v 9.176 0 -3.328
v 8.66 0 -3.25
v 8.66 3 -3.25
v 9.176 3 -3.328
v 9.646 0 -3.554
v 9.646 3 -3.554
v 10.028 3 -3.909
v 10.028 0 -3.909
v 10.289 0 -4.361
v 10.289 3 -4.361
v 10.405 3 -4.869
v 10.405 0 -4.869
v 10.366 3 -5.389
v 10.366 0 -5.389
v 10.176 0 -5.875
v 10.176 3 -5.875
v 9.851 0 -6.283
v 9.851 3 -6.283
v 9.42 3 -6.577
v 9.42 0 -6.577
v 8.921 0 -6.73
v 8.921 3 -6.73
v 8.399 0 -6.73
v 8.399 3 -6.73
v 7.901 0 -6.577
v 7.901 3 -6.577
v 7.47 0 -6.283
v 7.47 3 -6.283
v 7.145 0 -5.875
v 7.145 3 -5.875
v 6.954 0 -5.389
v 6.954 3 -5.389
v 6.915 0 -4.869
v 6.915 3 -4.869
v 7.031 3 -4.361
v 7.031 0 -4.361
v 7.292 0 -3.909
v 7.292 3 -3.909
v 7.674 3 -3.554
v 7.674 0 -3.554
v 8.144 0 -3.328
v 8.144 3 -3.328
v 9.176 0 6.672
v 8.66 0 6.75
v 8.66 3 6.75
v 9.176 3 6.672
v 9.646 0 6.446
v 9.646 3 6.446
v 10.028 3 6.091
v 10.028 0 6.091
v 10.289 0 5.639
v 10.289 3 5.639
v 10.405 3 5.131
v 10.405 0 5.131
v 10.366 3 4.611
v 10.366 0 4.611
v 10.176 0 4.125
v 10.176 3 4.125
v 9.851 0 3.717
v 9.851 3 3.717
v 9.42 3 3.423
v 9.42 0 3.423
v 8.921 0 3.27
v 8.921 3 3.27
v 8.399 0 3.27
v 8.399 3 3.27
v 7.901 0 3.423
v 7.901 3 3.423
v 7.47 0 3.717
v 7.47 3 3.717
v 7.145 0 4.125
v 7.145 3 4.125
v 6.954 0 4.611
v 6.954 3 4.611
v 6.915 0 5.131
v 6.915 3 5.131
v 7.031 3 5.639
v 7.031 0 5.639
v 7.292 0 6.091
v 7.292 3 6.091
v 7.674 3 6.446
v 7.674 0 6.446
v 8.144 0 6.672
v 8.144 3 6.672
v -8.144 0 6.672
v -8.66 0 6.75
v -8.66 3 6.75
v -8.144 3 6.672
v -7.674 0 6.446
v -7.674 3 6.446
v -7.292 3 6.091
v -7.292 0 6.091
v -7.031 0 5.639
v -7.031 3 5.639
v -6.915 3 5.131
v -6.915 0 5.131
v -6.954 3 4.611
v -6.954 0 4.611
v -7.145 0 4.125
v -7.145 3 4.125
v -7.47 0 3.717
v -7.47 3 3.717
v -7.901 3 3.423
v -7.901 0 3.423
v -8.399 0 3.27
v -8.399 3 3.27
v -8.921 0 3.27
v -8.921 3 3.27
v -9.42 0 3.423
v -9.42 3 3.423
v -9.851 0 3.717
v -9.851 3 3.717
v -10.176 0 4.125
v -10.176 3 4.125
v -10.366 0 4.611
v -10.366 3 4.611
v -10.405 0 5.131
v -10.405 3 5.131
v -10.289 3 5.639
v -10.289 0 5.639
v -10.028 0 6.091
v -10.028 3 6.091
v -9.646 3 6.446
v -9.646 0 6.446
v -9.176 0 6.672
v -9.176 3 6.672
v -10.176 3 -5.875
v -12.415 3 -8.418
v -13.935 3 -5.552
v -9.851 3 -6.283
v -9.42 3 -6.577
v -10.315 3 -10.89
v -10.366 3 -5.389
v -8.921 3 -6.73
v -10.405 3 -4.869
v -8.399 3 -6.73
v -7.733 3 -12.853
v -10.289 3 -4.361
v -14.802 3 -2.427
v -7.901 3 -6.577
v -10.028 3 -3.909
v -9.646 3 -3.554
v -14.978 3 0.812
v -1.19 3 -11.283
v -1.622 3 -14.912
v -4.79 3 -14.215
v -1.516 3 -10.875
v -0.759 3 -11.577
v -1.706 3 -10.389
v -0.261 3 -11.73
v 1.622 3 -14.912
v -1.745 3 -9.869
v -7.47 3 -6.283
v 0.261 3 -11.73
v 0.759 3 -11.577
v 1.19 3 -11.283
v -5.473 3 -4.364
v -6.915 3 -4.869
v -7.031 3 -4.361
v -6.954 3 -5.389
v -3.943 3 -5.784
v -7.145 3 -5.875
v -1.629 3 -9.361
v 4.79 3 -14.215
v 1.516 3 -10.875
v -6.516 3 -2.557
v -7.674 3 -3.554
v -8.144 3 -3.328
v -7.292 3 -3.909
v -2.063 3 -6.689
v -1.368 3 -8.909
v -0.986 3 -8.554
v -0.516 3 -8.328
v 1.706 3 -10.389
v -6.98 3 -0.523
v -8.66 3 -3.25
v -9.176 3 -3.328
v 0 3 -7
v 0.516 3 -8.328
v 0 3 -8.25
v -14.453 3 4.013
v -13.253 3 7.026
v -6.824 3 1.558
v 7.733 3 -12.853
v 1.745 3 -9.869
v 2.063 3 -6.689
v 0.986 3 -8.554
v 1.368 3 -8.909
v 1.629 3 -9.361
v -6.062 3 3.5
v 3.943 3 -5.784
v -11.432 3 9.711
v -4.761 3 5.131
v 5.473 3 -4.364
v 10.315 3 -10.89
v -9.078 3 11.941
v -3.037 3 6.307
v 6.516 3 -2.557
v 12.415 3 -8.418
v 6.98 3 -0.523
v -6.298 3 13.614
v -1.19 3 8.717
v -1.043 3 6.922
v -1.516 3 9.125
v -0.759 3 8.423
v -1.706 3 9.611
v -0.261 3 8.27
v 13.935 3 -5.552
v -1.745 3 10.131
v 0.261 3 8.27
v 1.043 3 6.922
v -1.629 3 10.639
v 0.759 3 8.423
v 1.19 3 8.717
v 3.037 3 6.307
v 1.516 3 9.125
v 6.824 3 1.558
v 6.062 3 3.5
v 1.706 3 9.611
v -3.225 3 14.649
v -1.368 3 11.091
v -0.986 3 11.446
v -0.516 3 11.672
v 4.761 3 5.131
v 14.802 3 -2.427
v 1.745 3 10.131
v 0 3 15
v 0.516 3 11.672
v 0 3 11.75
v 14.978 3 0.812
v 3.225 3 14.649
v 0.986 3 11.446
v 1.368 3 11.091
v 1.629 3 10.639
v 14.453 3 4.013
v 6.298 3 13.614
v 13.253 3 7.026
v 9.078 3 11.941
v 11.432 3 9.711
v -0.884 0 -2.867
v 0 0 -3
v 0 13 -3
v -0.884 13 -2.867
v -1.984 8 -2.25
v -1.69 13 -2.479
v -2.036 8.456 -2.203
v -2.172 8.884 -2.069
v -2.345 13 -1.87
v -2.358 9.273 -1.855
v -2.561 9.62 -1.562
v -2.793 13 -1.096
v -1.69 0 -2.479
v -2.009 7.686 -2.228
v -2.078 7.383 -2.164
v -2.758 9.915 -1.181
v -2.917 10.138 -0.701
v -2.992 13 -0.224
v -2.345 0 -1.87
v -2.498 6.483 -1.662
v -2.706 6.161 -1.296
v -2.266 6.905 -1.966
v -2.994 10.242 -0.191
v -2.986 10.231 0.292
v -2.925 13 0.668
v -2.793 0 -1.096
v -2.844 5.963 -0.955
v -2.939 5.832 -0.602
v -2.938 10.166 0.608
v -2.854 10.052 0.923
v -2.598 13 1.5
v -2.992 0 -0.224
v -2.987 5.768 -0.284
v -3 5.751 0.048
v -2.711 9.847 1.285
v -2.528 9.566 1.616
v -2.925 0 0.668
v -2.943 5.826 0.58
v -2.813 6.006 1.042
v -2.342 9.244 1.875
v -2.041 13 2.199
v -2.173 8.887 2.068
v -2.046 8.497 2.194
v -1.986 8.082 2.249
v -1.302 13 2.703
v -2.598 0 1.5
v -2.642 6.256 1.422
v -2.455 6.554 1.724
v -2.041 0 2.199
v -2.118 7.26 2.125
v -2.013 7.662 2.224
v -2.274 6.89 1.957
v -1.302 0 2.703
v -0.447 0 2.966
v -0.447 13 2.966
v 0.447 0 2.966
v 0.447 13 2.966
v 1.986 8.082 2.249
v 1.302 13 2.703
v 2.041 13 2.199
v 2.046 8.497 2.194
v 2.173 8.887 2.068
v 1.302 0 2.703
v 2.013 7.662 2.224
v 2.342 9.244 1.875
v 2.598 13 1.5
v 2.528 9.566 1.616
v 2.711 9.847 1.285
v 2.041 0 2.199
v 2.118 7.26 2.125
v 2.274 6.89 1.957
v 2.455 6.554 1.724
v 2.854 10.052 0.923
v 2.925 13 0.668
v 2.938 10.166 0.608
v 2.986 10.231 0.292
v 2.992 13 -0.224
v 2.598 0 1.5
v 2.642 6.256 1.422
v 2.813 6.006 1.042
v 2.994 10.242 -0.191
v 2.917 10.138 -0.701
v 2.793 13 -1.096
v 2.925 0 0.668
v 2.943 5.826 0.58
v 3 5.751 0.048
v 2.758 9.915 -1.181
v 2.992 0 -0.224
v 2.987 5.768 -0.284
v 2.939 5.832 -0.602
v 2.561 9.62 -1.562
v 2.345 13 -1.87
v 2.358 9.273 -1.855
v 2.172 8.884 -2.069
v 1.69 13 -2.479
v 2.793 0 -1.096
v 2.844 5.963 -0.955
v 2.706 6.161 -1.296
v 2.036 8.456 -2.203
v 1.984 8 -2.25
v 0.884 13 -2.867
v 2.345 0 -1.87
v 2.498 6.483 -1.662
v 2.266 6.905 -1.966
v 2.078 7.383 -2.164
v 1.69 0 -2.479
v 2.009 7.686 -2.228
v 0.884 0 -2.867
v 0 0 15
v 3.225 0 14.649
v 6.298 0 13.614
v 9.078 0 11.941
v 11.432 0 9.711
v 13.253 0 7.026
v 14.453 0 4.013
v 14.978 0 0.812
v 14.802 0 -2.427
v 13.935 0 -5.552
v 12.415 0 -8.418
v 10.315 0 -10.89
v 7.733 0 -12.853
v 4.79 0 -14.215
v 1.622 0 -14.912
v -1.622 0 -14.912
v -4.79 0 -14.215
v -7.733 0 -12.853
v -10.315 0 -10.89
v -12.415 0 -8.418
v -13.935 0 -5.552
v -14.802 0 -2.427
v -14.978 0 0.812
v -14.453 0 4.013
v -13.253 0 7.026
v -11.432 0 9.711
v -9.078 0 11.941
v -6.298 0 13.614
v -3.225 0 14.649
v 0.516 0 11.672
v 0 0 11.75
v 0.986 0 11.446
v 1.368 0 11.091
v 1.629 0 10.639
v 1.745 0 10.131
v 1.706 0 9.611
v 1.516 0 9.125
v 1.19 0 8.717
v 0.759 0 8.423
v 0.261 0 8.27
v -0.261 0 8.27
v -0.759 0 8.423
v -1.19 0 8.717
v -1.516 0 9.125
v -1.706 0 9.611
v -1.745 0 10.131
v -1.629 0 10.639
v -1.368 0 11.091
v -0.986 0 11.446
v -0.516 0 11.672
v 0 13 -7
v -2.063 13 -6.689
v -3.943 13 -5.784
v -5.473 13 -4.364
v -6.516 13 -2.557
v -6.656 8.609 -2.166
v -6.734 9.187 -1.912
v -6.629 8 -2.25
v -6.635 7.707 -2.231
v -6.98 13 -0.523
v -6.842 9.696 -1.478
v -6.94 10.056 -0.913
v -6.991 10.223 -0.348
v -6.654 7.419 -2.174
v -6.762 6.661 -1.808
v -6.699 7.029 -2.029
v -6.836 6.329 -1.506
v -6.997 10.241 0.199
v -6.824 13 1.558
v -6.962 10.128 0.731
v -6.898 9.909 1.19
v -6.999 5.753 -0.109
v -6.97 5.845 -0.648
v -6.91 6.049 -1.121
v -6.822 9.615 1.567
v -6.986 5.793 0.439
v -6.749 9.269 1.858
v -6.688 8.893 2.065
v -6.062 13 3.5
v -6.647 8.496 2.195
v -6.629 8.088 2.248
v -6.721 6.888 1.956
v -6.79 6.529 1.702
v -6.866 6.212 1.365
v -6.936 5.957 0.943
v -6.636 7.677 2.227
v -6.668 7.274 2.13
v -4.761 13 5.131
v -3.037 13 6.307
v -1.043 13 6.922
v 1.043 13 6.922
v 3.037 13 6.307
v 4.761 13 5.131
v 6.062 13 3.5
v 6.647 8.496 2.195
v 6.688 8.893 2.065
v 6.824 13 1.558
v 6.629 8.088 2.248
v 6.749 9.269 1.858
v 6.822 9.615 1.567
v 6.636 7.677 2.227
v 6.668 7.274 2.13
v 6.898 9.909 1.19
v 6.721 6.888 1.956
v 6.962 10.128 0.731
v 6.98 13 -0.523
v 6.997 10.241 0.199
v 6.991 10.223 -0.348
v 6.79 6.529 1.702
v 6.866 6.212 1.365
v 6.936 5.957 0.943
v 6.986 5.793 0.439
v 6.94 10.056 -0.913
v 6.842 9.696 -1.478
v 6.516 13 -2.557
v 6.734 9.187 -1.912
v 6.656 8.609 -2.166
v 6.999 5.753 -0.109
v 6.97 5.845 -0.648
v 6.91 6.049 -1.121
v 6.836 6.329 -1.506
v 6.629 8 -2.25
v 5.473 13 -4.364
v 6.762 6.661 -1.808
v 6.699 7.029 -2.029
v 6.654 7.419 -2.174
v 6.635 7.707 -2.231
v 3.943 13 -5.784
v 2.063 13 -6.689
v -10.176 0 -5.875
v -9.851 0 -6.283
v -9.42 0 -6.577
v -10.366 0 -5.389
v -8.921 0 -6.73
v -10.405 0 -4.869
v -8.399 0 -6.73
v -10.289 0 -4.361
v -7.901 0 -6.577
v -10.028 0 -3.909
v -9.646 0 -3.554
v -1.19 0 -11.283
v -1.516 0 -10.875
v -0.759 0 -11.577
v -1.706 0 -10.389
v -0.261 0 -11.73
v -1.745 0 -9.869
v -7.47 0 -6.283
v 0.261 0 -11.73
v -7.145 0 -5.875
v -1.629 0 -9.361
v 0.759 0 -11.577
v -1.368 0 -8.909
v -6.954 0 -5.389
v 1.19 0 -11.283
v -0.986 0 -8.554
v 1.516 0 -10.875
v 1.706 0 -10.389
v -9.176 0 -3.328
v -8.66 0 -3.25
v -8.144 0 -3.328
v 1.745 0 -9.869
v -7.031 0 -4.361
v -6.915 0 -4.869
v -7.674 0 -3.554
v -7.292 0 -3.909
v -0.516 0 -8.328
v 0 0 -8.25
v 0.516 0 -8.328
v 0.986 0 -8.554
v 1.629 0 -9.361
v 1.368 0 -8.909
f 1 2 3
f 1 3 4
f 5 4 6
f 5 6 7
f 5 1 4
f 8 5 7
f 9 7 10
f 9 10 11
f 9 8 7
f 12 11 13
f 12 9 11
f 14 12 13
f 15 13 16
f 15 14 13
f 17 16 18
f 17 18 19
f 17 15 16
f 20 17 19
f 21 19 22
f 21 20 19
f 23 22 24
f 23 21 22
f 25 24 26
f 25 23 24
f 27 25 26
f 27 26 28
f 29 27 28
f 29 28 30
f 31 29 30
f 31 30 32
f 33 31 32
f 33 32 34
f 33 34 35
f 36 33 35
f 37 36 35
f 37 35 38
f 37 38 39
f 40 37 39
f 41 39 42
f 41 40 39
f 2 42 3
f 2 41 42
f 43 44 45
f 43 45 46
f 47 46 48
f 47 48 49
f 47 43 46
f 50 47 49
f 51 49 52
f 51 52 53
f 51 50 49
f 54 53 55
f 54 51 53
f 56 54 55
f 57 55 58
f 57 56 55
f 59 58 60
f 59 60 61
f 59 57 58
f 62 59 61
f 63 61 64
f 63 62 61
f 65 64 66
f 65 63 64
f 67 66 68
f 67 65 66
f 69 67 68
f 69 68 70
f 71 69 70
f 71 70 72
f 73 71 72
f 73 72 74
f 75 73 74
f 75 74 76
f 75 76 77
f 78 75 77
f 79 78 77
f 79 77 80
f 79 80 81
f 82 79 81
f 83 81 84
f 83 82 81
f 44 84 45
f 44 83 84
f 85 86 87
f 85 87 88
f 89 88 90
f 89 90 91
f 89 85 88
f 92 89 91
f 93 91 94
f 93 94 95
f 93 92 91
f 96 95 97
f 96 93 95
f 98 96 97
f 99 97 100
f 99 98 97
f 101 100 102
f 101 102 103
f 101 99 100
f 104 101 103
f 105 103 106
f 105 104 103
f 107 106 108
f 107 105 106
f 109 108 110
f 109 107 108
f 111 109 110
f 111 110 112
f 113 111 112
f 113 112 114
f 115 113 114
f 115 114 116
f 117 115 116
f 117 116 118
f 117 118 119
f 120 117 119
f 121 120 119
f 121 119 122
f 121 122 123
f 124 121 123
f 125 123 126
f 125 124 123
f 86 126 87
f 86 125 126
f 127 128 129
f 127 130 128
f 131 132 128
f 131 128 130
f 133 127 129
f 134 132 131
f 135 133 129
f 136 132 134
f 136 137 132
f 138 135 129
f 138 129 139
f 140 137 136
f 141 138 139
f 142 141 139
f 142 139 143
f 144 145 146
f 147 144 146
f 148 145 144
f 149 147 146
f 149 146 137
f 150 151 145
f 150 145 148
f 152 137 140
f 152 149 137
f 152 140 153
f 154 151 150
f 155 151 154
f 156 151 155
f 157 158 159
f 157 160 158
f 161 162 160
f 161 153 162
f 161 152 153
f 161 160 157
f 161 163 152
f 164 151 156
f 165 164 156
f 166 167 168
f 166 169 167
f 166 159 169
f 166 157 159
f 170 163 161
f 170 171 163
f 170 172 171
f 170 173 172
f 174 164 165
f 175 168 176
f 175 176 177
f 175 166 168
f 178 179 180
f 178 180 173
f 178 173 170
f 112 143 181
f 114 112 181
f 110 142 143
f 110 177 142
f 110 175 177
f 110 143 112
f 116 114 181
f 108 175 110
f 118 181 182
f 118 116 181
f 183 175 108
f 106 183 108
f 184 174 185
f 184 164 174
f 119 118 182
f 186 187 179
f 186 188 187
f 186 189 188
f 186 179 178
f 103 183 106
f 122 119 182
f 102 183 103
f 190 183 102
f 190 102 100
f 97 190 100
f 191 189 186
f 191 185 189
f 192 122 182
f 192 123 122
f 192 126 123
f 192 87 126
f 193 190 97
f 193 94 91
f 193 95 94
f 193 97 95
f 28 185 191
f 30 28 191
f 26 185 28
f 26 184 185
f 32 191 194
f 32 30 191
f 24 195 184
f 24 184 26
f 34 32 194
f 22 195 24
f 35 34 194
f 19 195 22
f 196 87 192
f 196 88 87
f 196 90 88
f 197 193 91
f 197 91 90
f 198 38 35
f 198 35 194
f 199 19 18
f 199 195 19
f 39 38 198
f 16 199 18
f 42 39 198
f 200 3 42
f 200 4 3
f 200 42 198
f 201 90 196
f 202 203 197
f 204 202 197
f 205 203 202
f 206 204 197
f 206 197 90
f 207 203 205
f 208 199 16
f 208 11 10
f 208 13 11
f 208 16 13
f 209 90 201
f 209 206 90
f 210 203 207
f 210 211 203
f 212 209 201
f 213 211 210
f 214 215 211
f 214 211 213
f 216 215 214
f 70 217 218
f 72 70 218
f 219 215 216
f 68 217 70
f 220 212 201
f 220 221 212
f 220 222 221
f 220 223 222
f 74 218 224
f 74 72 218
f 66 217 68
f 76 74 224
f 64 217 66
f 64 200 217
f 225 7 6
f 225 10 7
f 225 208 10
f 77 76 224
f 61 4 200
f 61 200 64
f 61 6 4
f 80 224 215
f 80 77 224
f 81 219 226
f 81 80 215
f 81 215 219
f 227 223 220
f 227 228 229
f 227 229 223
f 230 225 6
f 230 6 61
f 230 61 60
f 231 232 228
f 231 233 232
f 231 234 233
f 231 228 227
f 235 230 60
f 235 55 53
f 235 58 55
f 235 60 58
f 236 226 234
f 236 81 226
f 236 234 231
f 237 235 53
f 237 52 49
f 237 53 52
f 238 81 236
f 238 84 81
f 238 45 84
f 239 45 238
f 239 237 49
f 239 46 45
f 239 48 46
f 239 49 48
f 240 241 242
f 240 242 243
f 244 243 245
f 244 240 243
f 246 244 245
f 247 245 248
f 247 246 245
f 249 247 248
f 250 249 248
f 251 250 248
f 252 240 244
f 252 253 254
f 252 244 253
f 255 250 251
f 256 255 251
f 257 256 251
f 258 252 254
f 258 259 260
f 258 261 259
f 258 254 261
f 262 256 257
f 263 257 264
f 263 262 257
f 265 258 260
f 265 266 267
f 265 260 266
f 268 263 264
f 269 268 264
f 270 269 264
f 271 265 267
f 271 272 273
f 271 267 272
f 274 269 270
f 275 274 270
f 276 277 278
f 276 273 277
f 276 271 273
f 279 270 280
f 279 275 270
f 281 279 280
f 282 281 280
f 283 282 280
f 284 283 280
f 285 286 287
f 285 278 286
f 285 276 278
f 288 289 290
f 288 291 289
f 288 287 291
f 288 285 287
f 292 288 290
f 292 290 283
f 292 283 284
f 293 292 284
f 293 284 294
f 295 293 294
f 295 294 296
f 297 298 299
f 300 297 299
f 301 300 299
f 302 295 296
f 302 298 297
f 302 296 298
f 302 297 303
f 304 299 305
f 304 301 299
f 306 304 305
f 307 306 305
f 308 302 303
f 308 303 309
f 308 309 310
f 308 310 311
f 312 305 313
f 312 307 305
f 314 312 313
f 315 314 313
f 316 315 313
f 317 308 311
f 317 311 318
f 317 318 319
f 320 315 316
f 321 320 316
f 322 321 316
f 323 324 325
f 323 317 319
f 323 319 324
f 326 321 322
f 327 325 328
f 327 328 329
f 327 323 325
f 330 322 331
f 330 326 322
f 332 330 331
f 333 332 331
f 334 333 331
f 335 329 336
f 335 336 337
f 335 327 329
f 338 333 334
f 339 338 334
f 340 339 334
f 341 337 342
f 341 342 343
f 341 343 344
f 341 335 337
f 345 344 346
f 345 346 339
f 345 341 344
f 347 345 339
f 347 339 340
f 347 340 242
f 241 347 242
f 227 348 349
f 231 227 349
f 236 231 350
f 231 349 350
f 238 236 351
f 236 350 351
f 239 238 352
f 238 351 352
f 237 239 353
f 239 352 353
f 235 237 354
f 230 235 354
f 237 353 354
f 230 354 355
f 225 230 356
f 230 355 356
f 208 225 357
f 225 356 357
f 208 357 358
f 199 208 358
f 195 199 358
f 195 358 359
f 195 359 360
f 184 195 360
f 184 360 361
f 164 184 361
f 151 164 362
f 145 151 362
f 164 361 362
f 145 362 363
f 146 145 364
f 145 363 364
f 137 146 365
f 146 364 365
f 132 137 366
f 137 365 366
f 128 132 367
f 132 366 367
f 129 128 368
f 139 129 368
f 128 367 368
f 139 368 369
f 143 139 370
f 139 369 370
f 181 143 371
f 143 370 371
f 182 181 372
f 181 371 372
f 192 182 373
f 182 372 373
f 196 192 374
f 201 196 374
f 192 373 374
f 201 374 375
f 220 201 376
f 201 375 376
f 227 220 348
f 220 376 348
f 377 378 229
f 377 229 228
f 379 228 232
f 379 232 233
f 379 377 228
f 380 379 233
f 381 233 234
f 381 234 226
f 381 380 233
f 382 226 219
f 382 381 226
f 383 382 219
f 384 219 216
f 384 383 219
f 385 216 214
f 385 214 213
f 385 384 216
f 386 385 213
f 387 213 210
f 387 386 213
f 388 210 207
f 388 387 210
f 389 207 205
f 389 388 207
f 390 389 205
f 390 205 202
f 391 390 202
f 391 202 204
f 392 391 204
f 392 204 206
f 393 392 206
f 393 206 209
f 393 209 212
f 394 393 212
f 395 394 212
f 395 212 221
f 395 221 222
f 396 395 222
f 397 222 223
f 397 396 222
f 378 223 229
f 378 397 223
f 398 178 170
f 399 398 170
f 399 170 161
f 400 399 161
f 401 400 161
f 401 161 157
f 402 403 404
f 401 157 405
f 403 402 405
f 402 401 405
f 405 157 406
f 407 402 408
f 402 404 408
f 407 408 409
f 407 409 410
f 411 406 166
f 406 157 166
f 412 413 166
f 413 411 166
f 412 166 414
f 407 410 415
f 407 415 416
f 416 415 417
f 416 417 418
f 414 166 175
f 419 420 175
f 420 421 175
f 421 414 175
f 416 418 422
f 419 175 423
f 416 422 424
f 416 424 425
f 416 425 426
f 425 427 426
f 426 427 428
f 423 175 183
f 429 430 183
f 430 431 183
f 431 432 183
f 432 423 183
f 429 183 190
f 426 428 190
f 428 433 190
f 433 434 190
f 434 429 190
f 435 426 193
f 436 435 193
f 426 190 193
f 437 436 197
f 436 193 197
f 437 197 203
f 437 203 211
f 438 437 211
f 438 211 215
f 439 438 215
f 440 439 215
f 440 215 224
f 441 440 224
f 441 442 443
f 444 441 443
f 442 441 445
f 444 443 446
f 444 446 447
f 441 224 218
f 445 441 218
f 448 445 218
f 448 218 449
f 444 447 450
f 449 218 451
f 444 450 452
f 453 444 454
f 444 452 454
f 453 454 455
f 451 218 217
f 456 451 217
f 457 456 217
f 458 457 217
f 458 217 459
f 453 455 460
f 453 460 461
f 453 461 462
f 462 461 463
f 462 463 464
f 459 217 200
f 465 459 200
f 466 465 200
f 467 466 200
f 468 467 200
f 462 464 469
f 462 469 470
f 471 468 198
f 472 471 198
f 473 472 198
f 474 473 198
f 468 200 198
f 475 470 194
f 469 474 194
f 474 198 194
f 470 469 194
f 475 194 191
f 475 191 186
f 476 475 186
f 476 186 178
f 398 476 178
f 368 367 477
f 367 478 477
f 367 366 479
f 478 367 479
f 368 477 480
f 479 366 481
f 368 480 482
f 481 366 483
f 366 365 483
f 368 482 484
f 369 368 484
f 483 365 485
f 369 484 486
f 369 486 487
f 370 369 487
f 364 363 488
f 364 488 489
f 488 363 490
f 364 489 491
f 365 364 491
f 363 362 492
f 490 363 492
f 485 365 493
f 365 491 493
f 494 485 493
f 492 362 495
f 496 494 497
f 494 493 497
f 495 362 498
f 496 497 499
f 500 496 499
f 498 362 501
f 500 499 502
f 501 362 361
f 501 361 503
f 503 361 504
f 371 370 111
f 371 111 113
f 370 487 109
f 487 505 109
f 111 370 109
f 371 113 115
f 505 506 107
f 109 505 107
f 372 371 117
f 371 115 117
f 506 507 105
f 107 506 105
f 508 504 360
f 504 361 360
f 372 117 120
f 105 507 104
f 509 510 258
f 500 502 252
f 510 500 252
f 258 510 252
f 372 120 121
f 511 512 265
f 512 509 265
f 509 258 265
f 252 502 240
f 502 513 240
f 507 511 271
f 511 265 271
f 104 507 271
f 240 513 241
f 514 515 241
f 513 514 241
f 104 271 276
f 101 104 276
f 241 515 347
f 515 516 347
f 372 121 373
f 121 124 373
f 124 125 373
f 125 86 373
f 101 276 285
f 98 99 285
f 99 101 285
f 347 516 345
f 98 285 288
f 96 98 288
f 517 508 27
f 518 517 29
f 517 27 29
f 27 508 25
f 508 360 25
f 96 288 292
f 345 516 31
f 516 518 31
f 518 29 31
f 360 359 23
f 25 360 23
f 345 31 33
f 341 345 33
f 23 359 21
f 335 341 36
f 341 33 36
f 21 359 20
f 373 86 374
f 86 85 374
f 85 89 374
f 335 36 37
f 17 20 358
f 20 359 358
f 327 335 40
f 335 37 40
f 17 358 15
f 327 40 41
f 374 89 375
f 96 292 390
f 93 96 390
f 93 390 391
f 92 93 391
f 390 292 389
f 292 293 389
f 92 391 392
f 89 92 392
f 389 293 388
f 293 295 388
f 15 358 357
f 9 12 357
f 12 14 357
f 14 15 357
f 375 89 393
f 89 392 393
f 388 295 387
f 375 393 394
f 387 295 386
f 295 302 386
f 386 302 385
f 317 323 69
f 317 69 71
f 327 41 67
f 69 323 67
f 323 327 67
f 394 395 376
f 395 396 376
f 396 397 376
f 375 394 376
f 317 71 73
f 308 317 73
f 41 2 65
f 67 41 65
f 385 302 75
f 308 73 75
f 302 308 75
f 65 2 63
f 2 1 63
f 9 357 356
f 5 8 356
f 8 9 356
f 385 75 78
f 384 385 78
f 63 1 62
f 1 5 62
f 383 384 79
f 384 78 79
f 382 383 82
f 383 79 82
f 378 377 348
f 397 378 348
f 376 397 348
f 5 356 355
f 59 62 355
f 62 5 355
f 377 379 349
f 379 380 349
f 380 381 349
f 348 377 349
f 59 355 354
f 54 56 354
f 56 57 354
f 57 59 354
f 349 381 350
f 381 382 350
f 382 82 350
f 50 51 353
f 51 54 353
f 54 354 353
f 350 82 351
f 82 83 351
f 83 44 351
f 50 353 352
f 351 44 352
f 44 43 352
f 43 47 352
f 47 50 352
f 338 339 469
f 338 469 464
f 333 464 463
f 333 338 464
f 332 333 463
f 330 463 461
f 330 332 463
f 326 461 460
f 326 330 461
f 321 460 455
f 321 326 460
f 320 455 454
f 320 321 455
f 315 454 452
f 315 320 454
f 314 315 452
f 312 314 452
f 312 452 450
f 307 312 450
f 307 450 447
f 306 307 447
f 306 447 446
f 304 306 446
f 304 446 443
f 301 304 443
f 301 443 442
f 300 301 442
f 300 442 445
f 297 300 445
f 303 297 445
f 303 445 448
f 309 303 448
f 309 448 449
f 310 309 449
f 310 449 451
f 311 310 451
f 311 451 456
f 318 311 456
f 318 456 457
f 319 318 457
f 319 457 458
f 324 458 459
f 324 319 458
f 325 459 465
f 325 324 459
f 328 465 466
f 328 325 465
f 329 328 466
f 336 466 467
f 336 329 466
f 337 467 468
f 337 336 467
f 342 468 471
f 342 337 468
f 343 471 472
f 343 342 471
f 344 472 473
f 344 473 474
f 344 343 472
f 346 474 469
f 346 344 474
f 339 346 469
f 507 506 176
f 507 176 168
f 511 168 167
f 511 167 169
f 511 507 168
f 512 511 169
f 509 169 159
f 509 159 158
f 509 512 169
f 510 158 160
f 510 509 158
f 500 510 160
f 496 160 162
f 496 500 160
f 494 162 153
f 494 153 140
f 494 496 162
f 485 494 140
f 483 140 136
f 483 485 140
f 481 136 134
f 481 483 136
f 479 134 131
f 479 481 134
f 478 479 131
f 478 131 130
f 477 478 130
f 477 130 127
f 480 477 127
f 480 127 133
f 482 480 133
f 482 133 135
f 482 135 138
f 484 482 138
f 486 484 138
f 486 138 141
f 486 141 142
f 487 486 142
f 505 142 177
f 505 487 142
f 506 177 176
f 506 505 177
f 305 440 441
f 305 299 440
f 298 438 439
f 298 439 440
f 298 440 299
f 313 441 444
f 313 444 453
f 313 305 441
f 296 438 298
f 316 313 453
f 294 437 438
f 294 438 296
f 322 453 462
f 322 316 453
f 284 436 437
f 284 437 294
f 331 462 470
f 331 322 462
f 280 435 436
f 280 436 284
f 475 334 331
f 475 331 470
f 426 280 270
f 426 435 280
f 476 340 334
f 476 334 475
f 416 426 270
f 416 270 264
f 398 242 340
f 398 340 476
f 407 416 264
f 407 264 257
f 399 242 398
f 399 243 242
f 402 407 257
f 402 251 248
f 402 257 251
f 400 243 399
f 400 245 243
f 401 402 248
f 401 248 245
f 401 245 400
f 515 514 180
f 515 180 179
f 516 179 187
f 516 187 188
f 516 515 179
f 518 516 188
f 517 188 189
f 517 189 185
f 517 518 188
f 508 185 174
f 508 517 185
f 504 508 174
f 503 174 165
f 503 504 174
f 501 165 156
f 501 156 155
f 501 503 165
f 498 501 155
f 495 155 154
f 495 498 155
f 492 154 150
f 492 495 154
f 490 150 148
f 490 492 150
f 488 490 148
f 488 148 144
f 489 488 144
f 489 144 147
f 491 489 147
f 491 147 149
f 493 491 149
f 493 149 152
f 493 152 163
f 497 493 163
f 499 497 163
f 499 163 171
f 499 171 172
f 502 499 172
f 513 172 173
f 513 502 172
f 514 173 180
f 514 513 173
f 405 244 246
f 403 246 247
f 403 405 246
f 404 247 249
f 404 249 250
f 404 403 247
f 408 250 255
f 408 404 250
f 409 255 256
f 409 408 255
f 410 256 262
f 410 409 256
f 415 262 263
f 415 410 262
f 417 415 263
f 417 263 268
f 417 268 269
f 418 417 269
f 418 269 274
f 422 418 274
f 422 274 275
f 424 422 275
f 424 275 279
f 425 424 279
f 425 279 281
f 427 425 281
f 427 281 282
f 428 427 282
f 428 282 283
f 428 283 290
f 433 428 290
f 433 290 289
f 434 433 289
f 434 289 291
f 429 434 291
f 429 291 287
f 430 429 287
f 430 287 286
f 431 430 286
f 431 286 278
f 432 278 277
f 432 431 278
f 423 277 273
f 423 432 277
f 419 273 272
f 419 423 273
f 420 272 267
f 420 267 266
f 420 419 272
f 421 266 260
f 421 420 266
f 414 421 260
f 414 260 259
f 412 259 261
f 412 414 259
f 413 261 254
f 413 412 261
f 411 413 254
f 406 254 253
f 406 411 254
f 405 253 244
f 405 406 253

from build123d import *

# Parameters (mm, degrees)
SKETCH1_R               = 15
SKETCH1_R_2             = 1.75
SKETCH1_R_3             = 7
BOSS_EXTRUDE1_DEPTH     = 3
SKETCH1_3_R             = 7
SKETCH1_3_R_2           = 3
BOSS_EXTRUDE2_DEPTH     = 13
CUT_EXTRUDE1_DEPTH      = 25.879710609
CUT_EXTRUDE1_DEPTH_BACK = 25.879710609
SKETCH2_R               = 2.25


with BuildPart() as part:
    # Sketch1 → Boss-Extrude1 (new body)
    with BuildSketch(Plane(origin=(0, 0, 0), x_dir=(1, 0, 0), z_dir=(0, 1, 0))):
        Circle(SKETCH1_R)
        with Locations((-8.660254038, -5)):
            Circle(SKETCH1_R_2, mode=Mode.SUBTRACT)
        with Locations((0, -10)):
            Circle(SKETCH1_R_2, mode=Mode.SUBTRACT)
        with Locations((8.660254038, -5)):
            Circle(SKETCH1_R_2, mode=Mode.SUBTRACT)
        with Locations((-8.660254038, 5)):
            Circle(SKETCH1_R_2, mode=Mode.SUBTRACT)
        Circle(SKETCH1_R_3, mode=Mode.SUBTRACT)
        with Locations((8.660254038, 5)):
            Circle(SKETCH1_R_2, mode=Mode.SUBTRACT)
        with Locations((0, 10)):
            Circle(SKETCH1_R_2, mode=Mode.SUBTRACT)
    extrude(amount=BOSS_EXTRUDE1_DEPTH)

    # Sketch1<3> → Boss-Extrude2 (add)
    with BuildSketch(Plane(origin=(0, 0, 0), x_dir=(1, 0, 0), z_dir=(0, 1, 0))):
        Circle(SKETCH1_3_R)
        Circle(SKETCH1_3_R_2, mode=Mode.SUBTRACT)
    extrude(amount=BOSS_EXTRUDE2_DEPTH)

    # Sketch2 → Cut-Extrude1 (cut, two sides: drawn at the far end of the back side and taken through both)
    with BuildSketch(Plane(origin=(0, 0, 0), x_dir=(0, 0, -1), z_dir=(1, 0, 0)).offset(-CUT_EXTRUDE1_DEPTH_BACK)):
        with Locations((0, 8)):
            Circle(SKETCH2_R)
    extrude(amount=CUT_EXTRUDE1_DEPTH + CUT_EXTRUDE1_DEPTH_BACK, mode=Mode.SUBTRACT)


solid = part.part
